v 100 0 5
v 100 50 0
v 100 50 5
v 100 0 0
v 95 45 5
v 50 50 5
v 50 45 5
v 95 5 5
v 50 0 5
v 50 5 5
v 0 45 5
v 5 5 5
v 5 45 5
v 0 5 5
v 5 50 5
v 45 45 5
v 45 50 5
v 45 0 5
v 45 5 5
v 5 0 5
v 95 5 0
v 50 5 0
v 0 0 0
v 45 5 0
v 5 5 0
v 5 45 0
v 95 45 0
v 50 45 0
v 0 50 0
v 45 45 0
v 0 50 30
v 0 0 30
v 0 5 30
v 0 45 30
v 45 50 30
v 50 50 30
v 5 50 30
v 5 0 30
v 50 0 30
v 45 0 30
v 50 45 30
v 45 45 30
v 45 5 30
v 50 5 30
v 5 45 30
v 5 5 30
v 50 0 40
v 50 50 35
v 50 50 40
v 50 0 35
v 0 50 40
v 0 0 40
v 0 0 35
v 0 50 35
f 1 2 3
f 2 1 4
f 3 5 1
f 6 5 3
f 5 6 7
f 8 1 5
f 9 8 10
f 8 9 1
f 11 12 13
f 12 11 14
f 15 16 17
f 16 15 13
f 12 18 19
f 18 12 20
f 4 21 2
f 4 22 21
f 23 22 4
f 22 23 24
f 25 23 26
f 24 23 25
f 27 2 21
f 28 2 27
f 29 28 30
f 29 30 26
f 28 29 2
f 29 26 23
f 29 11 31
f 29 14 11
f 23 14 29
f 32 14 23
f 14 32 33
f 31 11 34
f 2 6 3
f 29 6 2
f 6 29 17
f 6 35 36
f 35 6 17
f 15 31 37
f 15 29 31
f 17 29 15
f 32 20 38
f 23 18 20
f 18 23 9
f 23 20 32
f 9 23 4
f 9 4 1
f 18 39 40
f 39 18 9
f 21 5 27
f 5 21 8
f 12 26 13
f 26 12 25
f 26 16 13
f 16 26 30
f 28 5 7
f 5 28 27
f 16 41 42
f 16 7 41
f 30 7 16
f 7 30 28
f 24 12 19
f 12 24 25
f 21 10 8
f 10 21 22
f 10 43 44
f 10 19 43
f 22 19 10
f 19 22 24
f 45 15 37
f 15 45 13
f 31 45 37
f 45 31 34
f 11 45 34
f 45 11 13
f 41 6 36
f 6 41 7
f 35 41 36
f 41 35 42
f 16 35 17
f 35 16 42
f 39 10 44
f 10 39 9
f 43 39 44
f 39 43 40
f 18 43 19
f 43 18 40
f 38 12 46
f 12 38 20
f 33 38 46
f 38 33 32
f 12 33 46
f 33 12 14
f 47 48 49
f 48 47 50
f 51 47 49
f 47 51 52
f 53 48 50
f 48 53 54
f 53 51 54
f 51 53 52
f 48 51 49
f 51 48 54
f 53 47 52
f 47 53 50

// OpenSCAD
base_x = 100;
base_y = 50;
base_z = 5;
base_t = 5;
base_height = 30;

$fn=30;

base();

translate([0,0,base_height+base_t])cap();


module base(){
        difference(){
            cube([base_x,base_y,base_z]);
            translate([base_t,base_t,-0.5])cube([base_x-2*base_t,base_y-2*base_t,base_z+1]);
        }

        edge_square(base_height,base_t,45);
}





module edge_square(height,thickness, distance)
{
    translate([0,distance,0])cube([thickness,thickness,height]);
    translate([distance,distance,0])cube([thickness,thickness,height]);
    translate([distance,0,0])cube([thickness,thickness,height]);
    translate([0,0,0])cube([thickness,thickness,height]);
}

module cap(){
    cube([base_y,base_y,base_z]);
}
